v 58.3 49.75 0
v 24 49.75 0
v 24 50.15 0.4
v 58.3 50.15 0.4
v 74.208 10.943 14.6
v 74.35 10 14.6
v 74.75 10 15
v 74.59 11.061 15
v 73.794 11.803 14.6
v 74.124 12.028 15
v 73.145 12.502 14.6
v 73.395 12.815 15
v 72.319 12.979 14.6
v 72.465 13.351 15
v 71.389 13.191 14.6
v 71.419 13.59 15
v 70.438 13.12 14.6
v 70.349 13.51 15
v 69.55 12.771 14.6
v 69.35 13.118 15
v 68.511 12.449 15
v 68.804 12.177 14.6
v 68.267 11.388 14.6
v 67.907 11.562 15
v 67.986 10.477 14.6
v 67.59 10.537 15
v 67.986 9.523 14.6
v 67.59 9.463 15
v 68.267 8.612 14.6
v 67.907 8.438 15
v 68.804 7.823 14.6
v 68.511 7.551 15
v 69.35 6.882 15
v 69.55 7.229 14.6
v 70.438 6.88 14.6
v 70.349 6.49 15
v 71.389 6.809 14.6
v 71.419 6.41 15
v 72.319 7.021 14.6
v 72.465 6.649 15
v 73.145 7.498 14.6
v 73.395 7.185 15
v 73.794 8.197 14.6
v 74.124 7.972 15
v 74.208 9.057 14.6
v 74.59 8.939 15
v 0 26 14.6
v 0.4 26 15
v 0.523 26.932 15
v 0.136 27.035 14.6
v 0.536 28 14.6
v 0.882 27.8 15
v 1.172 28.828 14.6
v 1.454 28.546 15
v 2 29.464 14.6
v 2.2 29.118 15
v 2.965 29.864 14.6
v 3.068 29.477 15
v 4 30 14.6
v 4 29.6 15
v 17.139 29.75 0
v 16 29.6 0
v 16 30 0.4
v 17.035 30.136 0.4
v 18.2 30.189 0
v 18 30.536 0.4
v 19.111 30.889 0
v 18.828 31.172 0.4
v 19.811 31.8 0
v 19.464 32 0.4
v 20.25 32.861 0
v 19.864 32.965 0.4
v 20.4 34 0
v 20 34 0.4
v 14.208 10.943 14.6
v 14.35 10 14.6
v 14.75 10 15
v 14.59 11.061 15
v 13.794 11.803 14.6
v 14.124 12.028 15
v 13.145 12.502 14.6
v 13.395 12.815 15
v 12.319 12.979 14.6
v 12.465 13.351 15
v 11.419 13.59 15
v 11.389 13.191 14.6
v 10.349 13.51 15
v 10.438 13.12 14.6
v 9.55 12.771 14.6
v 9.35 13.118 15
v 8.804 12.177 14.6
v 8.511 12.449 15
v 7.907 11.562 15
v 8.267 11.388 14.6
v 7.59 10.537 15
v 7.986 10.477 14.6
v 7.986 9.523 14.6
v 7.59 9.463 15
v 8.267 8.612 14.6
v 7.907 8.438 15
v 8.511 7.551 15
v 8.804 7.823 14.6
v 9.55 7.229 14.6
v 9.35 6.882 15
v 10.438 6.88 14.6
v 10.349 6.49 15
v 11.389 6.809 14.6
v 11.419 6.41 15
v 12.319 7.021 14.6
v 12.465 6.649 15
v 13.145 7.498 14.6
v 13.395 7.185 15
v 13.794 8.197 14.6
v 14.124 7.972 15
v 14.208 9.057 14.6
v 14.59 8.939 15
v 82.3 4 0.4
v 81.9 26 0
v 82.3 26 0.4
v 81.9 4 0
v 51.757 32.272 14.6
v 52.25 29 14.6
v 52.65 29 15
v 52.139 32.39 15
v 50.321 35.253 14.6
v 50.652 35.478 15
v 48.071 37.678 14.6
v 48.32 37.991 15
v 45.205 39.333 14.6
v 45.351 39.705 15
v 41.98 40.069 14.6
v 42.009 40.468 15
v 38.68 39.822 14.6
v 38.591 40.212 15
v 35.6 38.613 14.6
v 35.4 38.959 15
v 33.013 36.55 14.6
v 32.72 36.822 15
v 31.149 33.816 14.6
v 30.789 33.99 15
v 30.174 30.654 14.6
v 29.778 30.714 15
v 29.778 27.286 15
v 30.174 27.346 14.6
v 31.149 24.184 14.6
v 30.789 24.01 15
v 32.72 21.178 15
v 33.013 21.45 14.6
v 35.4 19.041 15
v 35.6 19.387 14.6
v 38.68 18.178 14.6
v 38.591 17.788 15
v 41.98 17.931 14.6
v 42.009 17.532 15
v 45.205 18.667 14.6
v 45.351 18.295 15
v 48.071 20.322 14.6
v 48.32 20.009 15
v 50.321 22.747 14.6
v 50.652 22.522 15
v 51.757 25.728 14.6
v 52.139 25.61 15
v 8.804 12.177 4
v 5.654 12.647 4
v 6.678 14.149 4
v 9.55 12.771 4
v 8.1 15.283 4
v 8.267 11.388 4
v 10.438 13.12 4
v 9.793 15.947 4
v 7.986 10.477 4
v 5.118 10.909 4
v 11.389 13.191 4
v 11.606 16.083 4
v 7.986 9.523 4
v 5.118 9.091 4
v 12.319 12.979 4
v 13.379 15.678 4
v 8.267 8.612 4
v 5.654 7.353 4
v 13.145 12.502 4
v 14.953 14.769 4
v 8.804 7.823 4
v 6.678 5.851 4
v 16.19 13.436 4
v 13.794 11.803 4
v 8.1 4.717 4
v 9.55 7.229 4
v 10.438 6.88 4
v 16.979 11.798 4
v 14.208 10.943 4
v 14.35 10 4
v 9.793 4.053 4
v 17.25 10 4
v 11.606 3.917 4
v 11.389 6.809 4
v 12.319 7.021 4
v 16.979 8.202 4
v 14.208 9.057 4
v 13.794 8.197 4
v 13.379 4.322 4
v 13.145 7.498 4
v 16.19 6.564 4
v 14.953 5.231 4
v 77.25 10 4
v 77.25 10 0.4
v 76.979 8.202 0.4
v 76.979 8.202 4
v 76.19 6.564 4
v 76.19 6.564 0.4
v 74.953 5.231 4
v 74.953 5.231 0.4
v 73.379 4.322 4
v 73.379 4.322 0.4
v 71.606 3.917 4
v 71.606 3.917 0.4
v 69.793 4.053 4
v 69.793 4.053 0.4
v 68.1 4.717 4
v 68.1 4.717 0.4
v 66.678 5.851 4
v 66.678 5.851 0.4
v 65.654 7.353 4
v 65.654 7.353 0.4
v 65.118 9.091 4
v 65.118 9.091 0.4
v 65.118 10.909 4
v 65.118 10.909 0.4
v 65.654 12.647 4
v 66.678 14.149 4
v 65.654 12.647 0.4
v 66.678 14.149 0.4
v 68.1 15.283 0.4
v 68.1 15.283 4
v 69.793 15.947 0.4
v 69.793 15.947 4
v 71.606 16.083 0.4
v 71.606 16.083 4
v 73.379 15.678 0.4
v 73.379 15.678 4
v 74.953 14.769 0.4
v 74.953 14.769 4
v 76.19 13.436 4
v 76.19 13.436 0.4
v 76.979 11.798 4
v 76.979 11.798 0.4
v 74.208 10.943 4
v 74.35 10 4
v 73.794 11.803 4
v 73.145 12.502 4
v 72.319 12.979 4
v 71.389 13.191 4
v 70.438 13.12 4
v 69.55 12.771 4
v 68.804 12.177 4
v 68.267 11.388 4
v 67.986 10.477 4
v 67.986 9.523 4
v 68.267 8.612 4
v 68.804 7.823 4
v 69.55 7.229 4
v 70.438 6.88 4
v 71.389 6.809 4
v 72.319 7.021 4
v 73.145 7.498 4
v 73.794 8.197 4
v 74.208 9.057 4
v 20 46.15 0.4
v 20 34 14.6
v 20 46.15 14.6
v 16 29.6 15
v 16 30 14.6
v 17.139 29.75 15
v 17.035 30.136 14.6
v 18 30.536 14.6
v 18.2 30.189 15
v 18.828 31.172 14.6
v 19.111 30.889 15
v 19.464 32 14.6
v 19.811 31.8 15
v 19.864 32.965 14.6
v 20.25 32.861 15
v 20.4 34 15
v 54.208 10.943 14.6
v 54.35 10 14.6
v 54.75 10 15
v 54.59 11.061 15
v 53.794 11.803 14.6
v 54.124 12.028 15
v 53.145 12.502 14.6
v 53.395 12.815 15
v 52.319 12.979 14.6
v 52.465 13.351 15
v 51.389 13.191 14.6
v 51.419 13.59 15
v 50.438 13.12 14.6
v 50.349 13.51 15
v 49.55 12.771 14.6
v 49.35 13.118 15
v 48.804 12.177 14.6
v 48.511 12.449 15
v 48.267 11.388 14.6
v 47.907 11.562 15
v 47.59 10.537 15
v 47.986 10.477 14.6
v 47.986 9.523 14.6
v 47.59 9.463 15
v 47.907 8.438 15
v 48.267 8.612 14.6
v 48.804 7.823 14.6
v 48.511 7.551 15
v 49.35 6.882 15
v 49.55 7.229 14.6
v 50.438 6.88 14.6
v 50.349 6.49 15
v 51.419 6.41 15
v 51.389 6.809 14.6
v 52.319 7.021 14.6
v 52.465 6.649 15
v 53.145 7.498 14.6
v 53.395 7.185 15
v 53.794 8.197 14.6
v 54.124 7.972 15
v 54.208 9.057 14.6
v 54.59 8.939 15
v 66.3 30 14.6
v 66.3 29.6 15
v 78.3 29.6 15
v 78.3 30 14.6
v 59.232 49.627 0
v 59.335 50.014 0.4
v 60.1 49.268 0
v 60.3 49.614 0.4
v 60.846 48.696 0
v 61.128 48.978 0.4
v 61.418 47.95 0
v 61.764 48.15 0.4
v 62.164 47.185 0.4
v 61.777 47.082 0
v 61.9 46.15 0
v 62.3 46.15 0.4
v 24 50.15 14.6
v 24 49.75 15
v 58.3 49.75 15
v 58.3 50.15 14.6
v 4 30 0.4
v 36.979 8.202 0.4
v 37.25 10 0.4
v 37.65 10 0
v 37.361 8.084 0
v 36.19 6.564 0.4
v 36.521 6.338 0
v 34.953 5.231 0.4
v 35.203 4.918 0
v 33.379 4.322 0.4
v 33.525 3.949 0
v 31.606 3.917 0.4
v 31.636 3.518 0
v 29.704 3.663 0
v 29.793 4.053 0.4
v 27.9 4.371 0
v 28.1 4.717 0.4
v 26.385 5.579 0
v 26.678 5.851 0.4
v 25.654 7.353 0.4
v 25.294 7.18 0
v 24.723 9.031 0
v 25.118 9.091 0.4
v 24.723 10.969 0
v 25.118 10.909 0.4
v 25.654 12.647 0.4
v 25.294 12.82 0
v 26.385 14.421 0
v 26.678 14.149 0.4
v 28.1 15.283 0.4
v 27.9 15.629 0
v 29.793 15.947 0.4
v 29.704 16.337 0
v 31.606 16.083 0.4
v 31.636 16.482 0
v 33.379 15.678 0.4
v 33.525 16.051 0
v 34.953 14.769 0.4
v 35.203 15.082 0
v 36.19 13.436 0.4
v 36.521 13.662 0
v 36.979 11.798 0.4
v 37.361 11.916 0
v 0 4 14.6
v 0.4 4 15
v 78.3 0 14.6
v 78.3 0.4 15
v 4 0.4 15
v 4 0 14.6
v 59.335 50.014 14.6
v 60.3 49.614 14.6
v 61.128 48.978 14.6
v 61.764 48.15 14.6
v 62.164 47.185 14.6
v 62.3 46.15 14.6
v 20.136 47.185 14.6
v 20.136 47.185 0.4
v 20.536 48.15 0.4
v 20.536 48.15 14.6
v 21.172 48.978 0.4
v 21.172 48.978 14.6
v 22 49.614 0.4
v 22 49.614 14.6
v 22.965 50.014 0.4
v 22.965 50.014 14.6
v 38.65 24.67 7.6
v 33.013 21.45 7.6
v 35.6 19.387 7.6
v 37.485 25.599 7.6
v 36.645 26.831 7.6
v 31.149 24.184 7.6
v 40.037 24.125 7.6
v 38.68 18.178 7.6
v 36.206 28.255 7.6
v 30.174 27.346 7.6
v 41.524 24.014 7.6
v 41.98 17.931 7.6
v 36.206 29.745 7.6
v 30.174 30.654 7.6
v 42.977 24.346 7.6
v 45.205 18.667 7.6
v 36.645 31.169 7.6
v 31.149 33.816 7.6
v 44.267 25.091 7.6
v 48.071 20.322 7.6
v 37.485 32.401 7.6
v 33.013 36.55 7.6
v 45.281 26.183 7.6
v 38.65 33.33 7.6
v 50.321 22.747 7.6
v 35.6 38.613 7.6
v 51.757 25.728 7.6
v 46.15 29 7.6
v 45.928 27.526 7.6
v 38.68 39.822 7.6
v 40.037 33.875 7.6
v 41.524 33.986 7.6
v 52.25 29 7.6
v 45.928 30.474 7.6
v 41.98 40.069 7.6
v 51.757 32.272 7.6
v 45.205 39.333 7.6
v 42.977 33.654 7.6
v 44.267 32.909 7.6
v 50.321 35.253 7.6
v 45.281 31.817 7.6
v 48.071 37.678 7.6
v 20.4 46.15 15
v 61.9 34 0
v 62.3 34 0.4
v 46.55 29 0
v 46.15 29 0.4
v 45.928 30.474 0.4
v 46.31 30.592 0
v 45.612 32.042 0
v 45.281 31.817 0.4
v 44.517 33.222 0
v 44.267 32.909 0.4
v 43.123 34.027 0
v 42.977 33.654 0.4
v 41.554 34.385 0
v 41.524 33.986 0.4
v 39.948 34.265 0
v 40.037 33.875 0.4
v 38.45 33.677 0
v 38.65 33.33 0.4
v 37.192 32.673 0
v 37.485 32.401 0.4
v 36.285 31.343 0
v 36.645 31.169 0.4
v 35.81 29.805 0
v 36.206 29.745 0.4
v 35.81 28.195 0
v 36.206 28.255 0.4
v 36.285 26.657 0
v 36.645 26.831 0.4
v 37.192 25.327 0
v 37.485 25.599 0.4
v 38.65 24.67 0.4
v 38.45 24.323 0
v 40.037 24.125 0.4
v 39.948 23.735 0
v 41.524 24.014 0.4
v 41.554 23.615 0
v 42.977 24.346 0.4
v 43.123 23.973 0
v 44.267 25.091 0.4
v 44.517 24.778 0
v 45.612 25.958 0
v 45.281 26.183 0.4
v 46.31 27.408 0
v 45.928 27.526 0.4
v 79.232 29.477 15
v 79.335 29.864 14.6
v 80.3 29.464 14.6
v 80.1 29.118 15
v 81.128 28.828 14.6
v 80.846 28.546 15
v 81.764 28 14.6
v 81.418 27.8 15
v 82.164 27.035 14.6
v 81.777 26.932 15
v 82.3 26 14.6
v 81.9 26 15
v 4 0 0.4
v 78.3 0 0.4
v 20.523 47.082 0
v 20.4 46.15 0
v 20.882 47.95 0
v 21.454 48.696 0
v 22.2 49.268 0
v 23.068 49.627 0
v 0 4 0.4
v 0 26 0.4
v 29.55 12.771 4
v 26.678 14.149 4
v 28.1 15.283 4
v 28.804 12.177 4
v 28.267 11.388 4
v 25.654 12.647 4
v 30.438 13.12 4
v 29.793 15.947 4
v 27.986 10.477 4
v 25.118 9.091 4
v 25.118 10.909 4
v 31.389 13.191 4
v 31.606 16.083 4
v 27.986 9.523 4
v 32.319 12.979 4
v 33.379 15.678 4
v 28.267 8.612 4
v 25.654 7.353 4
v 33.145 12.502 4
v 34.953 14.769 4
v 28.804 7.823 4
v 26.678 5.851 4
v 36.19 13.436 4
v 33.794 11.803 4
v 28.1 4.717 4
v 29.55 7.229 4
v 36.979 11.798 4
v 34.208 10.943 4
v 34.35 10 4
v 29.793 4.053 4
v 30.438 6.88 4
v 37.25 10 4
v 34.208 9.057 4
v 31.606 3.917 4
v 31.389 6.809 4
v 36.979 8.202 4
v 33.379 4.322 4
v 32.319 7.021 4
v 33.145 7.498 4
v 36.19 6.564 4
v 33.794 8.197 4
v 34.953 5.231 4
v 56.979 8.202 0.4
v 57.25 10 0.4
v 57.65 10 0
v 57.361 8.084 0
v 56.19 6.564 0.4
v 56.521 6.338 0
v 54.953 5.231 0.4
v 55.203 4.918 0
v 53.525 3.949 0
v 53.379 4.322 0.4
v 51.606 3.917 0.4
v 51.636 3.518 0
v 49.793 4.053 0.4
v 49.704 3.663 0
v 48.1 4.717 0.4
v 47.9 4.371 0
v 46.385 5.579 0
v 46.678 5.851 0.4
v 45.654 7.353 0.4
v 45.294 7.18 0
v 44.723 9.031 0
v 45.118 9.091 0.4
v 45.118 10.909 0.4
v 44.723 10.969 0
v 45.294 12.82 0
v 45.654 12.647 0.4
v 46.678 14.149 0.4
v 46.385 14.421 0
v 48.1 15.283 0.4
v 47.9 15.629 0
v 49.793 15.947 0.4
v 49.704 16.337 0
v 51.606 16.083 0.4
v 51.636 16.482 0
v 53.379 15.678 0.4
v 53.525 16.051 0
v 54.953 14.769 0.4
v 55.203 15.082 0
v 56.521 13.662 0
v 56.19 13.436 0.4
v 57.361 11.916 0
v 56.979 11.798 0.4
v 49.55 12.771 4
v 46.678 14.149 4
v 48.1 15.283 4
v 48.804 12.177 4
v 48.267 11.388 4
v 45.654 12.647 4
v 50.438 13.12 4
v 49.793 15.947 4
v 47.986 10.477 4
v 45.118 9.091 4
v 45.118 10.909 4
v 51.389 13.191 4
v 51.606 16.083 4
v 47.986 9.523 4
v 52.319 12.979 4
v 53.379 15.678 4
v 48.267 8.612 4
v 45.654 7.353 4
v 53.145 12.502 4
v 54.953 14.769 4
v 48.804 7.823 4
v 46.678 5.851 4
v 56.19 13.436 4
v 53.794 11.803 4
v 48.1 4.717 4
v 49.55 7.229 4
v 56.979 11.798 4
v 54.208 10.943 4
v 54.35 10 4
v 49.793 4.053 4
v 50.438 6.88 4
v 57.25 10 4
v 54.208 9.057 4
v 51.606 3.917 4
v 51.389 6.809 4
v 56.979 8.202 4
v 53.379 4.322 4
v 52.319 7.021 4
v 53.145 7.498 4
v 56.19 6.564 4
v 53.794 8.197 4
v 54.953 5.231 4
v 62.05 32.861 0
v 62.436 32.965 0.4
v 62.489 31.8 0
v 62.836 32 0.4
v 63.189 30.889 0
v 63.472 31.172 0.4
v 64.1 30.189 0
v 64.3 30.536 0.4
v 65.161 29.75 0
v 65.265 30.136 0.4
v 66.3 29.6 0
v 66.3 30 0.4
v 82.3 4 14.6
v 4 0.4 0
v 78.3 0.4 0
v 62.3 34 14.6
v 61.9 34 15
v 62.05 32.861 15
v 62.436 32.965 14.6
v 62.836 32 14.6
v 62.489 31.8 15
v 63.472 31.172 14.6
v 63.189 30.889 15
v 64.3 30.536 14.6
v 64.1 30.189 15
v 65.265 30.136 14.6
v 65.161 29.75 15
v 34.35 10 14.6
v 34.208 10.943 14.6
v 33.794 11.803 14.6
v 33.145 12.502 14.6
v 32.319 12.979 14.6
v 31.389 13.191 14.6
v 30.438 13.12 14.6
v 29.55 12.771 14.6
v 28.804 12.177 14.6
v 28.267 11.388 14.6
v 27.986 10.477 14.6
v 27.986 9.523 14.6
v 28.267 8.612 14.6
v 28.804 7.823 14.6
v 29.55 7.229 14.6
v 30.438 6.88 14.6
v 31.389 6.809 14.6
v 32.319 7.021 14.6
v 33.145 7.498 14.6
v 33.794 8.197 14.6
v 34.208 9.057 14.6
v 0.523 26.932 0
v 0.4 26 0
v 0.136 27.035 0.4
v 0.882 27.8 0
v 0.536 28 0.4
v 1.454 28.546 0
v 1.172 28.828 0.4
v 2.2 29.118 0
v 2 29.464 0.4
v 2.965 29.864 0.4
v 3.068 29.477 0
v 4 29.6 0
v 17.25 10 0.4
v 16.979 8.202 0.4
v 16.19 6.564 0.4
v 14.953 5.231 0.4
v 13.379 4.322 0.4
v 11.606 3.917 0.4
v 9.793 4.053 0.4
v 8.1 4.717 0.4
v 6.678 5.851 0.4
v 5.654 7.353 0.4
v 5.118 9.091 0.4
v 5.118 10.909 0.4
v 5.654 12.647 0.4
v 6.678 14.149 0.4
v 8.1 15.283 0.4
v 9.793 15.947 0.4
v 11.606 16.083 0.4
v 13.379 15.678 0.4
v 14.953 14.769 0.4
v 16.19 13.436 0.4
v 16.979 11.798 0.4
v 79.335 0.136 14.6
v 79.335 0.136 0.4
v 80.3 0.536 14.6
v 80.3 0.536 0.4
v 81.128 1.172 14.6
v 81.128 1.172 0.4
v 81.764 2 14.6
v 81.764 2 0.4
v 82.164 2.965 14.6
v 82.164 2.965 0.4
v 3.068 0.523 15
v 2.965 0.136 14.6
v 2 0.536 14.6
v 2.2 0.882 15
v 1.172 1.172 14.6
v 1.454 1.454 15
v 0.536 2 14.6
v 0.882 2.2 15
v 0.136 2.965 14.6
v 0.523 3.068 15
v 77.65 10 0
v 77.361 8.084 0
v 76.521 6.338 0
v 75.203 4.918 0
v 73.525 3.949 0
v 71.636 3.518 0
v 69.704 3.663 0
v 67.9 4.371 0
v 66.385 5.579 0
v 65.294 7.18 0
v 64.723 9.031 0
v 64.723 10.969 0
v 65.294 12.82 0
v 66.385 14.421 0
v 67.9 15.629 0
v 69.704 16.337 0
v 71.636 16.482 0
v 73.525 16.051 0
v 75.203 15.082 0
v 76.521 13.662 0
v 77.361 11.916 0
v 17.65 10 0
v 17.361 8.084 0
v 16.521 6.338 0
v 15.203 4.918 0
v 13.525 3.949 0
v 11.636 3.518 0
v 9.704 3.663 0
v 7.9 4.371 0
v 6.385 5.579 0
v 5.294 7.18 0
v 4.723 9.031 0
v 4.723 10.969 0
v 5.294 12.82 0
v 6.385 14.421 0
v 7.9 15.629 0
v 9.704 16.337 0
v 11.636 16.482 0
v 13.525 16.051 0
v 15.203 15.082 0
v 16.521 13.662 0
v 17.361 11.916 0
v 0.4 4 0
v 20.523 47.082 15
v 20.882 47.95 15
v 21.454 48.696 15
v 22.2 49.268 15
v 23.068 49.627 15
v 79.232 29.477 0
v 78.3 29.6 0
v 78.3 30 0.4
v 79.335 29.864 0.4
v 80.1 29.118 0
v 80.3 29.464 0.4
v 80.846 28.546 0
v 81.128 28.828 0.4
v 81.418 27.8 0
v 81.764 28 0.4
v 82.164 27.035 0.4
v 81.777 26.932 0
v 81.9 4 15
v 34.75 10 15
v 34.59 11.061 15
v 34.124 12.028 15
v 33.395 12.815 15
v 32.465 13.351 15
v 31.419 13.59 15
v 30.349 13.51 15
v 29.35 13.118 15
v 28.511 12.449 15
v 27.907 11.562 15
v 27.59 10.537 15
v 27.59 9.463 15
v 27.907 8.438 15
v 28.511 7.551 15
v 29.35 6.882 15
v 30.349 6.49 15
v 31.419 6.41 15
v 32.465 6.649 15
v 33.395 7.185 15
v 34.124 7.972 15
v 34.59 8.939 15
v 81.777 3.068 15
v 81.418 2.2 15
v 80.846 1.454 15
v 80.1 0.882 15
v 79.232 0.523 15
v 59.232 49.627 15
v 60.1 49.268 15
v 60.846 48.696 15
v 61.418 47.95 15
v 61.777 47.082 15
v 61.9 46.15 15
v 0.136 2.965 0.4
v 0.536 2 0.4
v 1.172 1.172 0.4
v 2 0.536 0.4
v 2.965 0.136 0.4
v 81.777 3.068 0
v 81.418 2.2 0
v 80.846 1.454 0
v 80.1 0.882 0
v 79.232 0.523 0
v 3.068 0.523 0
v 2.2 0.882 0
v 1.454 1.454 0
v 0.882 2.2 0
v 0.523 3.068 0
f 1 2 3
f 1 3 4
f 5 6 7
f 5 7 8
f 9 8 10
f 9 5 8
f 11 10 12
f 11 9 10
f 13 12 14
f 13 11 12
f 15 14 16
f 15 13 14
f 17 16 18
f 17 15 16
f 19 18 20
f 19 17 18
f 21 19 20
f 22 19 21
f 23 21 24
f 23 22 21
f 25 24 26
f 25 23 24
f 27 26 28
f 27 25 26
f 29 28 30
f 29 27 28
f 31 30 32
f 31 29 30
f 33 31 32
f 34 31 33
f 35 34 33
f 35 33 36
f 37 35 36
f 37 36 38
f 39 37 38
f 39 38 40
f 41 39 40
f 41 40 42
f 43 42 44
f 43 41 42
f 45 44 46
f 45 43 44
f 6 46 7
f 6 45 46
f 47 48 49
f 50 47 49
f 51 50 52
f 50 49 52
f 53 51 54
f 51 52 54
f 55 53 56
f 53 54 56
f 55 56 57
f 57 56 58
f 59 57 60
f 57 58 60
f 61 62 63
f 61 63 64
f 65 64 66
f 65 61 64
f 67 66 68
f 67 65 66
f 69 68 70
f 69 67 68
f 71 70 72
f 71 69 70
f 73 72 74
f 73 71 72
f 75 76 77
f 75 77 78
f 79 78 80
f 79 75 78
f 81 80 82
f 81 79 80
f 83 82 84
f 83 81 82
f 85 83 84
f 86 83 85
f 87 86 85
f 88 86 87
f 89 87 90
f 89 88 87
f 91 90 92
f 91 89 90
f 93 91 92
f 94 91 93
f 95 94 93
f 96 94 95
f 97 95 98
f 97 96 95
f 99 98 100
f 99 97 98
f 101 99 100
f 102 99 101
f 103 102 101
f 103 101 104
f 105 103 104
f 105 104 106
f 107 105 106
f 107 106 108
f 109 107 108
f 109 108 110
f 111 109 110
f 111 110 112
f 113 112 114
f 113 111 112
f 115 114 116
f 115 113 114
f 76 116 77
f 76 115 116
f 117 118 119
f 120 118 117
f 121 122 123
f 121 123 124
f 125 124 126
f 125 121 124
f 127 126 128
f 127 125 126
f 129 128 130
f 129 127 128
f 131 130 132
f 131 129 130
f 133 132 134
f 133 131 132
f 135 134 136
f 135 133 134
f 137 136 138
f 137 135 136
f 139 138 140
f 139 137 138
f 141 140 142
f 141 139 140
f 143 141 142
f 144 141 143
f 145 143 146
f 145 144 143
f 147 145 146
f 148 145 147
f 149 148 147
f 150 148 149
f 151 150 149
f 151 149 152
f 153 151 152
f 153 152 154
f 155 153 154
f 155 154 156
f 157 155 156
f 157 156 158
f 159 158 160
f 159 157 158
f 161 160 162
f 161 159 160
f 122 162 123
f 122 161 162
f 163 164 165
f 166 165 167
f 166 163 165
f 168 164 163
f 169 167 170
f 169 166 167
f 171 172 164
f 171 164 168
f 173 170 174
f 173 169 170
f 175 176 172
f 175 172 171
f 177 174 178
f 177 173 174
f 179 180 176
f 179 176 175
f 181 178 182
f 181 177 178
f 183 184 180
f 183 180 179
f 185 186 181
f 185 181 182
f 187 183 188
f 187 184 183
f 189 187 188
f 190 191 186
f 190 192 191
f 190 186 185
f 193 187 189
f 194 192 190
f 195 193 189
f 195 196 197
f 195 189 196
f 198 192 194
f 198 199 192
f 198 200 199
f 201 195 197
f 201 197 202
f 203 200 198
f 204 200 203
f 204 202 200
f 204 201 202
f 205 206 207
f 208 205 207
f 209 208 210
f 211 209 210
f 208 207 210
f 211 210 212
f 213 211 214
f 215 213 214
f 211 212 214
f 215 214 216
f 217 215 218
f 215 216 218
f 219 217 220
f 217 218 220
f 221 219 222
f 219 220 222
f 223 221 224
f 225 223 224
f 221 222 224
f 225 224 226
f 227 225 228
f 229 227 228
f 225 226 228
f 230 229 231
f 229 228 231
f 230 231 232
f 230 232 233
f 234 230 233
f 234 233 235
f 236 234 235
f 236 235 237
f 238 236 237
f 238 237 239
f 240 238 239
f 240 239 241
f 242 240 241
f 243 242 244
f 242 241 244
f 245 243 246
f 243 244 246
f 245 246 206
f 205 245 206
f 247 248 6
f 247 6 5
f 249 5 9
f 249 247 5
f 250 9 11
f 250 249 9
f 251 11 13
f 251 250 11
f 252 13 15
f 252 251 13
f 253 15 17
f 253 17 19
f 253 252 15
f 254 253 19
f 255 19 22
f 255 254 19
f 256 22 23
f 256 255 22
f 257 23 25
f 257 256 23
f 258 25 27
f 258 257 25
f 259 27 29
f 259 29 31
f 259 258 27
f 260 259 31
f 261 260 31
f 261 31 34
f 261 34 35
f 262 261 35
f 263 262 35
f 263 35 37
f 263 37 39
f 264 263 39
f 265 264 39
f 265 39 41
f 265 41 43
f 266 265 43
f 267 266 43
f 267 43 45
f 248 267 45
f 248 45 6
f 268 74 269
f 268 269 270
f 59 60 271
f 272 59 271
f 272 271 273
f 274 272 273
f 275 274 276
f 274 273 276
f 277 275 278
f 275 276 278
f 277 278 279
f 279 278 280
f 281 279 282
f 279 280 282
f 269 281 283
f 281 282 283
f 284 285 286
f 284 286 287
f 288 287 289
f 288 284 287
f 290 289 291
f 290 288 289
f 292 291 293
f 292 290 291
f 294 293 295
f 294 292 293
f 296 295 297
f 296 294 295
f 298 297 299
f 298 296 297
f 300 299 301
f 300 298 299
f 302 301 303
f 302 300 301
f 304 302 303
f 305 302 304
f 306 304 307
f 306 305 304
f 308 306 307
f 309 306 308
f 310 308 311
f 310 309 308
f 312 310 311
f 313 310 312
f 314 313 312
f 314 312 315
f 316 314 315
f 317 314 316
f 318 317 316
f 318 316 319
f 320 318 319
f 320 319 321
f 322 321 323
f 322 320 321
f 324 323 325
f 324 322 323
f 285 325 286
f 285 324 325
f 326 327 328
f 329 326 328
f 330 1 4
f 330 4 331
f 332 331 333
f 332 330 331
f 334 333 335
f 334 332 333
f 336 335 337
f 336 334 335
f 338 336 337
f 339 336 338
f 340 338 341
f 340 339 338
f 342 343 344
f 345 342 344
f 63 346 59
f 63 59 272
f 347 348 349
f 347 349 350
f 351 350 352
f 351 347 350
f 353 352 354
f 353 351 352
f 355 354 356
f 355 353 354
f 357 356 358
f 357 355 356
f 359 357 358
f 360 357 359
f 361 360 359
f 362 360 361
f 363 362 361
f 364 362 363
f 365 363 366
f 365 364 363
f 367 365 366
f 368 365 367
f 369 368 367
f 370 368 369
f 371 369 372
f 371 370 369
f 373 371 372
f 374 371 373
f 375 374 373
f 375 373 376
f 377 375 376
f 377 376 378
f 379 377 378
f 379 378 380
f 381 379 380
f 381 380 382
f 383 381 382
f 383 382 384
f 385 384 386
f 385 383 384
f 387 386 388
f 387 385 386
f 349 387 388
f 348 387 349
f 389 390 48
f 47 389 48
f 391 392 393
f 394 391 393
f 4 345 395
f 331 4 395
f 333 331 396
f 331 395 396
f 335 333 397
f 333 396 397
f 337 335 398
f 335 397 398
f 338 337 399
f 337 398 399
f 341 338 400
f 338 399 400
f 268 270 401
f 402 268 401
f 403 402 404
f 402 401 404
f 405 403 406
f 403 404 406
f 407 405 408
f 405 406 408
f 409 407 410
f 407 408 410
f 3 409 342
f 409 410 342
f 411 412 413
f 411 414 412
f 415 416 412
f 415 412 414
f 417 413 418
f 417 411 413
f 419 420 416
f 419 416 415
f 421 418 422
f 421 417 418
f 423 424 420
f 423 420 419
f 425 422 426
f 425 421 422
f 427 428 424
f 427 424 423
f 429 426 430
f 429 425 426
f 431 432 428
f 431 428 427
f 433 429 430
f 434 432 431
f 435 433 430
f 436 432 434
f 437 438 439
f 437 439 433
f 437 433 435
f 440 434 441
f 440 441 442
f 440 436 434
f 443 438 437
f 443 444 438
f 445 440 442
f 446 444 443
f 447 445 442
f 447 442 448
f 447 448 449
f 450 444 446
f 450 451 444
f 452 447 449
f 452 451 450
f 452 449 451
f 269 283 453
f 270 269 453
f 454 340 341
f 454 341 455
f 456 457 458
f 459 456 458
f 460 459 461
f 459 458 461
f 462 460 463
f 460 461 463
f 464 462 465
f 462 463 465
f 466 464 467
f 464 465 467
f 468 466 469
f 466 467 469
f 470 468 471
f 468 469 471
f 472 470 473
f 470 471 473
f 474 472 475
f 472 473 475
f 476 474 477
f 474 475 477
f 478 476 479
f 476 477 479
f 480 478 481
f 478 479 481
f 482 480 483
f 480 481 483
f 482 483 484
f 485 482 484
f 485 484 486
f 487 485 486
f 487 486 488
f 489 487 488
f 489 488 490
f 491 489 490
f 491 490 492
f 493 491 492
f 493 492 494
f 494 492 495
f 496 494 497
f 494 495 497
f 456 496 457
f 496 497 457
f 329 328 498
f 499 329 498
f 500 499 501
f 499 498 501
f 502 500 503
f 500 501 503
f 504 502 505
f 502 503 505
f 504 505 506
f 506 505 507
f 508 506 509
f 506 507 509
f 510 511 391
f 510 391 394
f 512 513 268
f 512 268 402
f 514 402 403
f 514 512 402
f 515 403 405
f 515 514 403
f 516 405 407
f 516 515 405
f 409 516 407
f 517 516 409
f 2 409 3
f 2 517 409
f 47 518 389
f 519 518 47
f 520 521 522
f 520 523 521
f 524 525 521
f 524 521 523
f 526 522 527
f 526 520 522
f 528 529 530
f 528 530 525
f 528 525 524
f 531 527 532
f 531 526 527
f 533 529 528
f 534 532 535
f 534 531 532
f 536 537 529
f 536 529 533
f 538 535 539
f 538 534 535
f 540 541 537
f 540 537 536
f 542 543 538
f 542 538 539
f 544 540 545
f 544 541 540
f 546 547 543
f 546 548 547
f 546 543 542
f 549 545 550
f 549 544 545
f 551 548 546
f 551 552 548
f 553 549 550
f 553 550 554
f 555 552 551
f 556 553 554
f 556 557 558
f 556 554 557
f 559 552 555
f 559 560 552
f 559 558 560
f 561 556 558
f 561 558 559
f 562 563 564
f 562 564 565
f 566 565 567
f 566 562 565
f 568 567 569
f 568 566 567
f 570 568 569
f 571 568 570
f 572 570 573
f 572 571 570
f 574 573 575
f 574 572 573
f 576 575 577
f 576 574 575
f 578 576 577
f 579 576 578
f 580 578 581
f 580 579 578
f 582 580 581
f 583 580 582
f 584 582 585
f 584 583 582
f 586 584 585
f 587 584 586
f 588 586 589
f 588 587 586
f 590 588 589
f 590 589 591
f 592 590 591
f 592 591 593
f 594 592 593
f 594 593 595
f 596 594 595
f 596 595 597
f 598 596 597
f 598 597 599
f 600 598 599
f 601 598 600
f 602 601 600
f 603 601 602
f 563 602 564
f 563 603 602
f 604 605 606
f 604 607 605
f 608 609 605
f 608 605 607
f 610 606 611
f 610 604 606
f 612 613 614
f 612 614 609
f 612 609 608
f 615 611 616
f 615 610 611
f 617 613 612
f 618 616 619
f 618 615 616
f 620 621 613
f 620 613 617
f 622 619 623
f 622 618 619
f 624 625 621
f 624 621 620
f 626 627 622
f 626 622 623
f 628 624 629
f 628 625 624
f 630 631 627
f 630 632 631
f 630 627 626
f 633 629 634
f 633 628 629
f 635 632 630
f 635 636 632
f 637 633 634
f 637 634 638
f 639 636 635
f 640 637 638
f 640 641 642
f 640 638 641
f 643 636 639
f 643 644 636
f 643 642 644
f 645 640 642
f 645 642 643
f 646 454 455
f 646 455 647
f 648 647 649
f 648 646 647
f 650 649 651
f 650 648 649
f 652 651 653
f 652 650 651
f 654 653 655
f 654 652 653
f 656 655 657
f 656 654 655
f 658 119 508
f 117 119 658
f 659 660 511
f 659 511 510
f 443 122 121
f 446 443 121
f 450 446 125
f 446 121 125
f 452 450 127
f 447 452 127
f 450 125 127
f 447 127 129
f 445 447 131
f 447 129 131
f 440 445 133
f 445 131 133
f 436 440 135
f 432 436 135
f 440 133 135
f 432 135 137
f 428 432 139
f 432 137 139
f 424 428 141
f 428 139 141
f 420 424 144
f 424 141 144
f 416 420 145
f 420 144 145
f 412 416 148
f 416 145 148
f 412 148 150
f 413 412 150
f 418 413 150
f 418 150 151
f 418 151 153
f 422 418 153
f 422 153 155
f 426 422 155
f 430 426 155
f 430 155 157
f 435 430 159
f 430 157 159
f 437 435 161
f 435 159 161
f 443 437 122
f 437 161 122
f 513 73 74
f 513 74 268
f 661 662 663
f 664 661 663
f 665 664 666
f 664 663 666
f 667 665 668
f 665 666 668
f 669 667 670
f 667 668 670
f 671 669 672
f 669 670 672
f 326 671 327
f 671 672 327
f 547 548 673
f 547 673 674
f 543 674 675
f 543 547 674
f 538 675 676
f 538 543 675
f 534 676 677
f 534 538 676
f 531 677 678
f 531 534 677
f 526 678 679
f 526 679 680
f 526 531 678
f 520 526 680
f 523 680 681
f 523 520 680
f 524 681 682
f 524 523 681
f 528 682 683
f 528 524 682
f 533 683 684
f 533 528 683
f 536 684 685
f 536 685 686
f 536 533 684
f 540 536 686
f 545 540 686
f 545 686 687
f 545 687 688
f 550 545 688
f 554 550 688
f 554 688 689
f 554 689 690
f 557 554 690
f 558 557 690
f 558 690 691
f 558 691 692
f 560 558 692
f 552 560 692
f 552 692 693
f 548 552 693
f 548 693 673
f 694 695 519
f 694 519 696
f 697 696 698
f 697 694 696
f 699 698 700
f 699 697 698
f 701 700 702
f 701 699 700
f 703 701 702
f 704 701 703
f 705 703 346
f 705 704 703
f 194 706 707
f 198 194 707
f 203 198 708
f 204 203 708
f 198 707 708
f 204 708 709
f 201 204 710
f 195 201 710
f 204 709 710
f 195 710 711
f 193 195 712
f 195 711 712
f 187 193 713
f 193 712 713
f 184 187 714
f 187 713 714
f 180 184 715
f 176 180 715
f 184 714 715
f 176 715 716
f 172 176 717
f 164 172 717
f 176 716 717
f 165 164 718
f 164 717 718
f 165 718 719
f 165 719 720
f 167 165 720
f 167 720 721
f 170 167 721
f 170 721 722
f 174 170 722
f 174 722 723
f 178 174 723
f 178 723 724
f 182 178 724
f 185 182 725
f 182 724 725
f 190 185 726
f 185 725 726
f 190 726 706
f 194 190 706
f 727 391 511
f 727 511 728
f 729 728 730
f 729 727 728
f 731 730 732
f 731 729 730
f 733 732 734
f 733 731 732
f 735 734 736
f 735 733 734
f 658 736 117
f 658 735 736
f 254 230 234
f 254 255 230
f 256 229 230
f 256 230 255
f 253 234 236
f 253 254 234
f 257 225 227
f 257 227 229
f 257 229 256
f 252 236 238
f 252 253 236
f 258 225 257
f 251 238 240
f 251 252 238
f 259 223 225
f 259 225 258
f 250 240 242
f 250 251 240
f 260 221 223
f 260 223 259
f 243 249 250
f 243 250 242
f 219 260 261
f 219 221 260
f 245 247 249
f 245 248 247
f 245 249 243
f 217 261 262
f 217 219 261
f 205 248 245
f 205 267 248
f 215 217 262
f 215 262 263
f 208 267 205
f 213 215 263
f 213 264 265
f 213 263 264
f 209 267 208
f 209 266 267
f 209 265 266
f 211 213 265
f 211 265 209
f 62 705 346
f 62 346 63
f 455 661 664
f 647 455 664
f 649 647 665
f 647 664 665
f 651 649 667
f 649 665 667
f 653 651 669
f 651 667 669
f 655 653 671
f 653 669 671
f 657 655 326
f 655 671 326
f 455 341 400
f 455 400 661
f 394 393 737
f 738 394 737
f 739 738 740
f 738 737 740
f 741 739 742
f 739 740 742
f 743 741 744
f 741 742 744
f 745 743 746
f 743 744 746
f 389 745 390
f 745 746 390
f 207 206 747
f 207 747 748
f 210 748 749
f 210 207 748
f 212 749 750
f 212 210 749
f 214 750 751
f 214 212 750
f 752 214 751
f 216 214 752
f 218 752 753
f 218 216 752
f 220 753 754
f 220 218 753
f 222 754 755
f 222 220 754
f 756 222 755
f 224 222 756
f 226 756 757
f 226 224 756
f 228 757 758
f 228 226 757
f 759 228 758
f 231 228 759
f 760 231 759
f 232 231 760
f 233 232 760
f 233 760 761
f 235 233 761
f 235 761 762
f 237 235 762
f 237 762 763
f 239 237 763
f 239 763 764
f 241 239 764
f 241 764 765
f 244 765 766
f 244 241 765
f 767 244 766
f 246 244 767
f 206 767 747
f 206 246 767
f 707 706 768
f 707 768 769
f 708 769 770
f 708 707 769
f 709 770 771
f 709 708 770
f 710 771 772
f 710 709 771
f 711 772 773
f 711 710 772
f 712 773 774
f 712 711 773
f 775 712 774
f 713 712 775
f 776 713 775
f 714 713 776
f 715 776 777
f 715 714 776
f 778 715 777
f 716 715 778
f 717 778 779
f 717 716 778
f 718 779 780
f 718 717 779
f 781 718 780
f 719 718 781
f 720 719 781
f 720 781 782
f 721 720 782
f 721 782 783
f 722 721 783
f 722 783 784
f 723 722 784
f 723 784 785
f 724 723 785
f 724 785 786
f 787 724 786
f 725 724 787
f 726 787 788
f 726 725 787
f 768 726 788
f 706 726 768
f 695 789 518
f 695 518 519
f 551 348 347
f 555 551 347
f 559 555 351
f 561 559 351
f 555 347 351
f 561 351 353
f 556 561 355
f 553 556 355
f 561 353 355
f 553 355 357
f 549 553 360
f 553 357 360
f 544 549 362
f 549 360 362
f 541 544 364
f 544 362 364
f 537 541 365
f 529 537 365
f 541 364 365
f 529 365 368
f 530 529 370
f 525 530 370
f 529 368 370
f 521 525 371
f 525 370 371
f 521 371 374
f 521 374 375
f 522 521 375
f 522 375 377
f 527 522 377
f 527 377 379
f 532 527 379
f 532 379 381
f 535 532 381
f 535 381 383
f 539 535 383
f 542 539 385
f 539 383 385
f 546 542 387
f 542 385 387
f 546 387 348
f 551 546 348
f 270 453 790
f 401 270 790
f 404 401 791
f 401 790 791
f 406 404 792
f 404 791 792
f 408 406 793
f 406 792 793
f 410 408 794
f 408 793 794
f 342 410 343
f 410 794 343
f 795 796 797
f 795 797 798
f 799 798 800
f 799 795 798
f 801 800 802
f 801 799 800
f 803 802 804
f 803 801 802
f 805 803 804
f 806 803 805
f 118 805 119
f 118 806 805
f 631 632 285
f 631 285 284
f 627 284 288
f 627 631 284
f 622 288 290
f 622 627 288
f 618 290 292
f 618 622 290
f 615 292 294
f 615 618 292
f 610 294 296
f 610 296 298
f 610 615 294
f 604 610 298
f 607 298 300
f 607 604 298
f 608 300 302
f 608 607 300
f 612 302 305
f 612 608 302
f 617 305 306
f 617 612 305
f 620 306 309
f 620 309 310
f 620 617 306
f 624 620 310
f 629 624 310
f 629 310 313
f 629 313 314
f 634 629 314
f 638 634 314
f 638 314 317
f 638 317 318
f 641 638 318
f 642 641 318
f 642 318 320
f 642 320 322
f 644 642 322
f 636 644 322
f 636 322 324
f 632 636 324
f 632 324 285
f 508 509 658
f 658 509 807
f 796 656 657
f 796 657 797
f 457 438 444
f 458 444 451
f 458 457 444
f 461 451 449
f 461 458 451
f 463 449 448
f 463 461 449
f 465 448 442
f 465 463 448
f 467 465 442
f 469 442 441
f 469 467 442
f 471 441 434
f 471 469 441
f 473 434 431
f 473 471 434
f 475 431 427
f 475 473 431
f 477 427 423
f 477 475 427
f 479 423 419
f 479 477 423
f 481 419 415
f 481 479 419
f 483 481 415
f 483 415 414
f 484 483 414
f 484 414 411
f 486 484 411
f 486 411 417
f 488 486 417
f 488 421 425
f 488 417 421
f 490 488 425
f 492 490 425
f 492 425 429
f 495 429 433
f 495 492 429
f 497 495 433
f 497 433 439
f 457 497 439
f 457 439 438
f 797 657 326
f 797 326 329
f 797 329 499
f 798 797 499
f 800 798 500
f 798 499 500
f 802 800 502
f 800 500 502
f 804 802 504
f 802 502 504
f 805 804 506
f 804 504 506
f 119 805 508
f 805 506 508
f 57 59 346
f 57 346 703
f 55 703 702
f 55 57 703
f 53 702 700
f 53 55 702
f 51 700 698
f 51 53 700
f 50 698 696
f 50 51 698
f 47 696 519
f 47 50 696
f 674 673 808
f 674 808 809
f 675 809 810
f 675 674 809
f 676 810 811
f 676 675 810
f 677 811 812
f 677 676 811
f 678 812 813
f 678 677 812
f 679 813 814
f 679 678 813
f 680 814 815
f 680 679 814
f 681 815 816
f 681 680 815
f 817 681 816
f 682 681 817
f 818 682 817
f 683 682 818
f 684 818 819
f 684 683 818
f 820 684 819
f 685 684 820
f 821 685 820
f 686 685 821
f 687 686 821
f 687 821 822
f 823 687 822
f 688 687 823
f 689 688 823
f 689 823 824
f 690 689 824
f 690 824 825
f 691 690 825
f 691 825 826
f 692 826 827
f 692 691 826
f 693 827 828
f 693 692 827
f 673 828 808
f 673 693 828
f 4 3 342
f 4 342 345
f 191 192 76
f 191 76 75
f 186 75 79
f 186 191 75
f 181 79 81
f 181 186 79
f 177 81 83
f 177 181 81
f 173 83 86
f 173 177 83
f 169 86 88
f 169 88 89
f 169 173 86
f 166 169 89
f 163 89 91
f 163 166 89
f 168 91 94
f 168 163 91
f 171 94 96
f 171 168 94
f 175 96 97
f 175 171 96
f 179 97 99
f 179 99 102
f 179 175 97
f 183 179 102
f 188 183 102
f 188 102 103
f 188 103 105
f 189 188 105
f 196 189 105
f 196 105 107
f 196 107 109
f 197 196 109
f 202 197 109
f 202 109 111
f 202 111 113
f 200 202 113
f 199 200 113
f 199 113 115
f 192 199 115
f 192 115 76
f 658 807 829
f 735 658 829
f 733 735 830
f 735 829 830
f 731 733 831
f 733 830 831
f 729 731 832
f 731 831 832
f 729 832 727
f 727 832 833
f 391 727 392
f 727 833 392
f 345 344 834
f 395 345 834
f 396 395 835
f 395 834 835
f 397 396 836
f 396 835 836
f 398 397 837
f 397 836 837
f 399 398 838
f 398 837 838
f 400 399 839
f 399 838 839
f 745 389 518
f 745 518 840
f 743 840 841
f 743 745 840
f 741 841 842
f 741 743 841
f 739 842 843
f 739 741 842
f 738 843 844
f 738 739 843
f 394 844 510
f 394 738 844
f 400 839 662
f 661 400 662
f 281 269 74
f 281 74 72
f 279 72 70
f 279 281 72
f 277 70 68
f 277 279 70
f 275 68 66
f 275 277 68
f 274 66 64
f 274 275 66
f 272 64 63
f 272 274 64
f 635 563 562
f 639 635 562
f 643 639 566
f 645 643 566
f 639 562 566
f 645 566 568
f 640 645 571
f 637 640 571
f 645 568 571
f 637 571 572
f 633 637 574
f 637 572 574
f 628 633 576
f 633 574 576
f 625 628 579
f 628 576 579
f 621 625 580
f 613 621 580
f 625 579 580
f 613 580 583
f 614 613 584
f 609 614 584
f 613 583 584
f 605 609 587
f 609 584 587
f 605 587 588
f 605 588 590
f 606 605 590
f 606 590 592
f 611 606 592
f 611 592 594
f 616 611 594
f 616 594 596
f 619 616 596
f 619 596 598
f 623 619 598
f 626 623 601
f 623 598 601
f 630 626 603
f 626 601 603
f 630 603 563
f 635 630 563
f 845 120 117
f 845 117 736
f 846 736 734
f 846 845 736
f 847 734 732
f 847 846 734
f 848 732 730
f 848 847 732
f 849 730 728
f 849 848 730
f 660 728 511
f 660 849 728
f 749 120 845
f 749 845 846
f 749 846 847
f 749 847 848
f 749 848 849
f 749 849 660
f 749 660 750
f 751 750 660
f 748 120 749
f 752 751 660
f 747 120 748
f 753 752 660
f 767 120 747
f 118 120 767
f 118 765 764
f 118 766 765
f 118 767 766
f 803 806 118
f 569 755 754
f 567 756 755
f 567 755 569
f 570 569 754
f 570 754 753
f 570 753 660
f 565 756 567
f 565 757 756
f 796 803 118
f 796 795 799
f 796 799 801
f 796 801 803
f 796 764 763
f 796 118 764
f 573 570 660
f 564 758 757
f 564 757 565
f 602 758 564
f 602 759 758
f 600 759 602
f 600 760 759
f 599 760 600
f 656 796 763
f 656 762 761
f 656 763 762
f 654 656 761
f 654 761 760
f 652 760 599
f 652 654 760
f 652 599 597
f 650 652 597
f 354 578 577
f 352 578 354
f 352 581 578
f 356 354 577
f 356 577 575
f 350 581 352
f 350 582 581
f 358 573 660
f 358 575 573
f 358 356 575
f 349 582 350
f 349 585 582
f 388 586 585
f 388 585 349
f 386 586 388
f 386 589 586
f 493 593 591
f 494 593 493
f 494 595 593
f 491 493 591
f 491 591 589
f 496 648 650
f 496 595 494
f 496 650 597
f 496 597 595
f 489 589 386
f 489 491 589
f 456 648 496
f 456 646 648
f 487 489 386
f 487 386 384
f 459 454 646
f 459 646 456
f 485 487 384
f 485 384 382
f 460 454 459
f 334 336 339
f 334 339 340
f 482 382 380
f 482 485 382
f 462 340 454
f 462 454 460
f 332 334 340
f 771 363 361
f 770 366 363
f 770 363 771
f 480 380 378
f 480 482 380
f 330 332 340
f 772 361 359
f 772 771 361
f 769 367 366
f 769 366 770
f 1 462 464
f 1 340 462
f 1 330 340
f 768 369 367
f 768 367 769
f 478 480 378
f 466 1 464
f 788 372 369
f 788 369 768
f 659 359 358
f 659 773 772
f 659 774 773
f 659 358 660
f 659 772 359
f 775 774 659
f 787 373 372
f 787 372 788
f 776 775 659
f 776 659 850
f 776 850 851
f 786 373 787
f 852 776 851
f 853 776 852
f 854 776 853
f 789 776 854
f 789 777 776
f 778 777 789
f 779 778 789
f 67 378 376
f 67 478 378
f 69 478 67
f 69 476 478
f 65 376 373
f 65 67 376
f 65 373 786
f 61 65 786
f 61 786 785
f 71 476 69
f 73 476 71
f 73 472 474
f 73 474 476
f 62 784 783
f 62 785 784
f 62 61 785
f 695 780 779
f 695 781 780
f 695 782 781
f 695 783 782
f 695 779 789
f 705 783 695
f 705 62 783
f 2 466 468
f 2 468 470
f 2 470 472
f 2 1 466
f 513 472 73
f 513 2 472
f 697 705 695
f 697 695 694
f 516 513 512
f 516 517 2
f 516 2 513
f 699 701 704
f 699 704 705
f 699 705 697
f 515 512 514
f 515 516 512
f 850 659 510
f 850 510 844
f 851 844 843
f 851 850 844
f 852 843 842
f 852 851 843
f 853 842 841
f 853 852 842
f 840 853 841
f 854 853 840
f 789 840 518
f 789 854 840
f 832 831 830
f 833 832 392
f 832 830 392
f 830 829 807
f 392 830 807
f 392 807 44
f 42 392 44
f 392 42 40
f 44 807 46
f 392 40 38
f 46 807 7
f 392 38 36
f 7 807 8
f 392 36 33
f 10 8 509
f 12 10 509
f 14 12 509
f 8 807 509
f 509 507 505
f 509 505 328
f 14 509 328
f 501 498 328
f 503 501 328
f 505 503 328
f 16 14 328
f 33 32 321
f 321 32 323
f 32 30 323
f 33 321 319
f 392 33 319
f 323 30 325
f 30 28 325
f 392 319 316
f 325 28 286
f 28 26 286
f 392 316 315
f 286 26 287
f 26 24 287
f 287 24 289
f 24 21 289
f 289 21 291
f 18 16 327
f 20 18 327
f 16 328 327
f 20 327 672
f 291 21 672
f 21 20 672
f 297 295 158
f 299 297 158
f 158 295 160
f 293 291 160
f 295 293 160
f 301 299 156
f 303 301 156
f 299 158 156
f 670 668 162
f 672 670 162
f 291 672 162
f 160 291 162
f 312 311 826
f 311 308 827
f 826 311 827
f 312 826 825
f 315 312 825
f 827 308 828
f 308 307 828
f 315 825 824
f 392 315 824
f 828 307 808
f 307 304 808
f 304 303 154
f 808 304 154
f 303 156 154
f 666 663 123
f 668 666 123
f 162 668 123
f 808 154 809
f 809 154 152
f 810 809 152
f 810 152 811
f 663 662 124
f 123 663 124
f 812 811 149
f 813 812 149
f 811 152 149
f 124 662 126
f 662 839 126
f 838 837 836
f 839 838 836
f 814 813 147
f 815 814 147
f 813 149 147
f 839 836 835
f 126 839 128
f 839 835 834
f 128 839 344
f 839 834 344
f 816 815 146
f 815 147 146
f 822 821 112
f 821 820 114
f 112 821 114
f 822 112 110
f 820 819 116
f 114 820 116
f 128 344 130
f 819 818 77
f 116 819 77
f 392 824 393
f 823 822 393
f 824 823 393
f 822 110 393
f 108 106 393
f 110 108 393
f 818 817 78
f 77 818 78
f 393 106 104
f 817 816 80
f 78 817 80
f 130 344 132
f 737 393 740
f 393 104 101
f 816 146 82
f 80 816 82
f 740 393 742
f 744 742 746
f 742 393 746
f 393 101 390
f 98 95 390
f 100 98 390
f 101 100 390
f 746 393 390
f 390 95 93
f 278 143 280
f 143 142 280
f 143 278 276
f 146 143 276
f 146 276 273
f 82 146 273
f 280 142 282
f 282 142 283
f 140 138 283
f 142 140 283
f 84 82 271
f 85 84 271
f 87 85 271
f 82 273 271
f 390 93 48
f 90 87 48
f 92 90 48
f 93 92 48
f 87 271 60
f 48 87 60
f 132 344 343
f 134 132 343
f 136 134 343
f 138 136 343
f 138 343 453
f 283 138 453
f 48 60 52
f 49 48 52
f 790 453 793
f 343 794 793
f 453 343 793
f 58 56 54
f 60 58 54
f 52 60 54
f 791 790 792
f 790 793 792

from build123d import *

# Parameters (mm, degrees)
SKETCH_R        = 5
SKETCH_R_2      = 3.2
PAD_DEPTH       = 15
SKETCH002_R     = 6.1
POCKET001_DEPTH = 4
SKETCH003_R     = 11.1
POCKET_DEPTH    = 7.4
FILLET_R        = 4
CHAMFER_SIZE    = 0.4
CHAMFER001_SIZE = 0.4


with BuildPart() as part:
    # Sketch → Pad (new body)
    with BuildSketch(Plane.XY):
        Polygon((20, 30), (20, 50.15), (62.3, 50.15), (62.3, 30), (82.3, 30), (82.3, 0), (0, 0), (0, 30), align=None)
        with Locations((41.15, 29)):
            Circle(SKETCH_R, mode=Mode.SUBTRACT)
        with Locations((11.15, 10)):
            Circle(SKETCH_R_2, mode=Mode.SUBTRACT)
        with Locations((31.15, 10)):
            Circle(SKETCH_R_2, mode=Mode.SUBTRACT)
        with Locations((51.15, 10)):
            Circle(SKETCH_R_2, mode=Mode.SUBTRACT)
        with Locations((71.15, 10)):
            Circle(SKETCH_R_2, mode=Mode.SUBTRACT)
    extrude(amount=PAD_DEPTH)

    # Sketch002 → Pocket001 (cut)
    with BuildSketch(Plane(origin=(0, 0, 0), x_dir=(1, 0, 0), z_dir=(0, 0, -1))):
        with Locations((11.15, -10)):
            Circle(SKETCH002_R)
        with Locations((31.15, -10)):
            Circle(SKETCH002_R)
        with Locations((51.15, -10)):
            Circle(SKETCH002_R)
        with Locations((71.15, -10)):
            Circle(SKETCH002_R)
    extrude(amount=-POCKET001_DEPTH, mode=Mode.SUBTRACT)

    # Sketch003 (on Face5 of Pocket001) → Pocket (cut)
    with BuildSketch(Plane.XY.offset(15)):
        with Locations((41.15, 29)):
            Circle(SKETCH003_R)
    extrude(amount=-POCKET_DEPTH, mode=Mode.SUBTRACT)

    # Fillet
    fillet_edges = [part.edges().sort_by_distance(p)[0] for p in [
        (82.3, 0, 7.5),
        (0, 0, 7.5),
        (0, 30, 7.5),
        (20, 30, 7.5),
        (20, 50.15, 7.5),
        (62.3, 50.15, 7.5),
        (62.3, 30, 7.5),
        (82.3, 30, 7.5),
    ]]
    fillet(fillet_edges, radius=FILLET_R)

    # Chamfer
    chamfer_edges = [part.edges().sort_by_distance(p)[0] for p in [
        (20, 40.075, 15),
        (18.828427, 31.171573, 15),
        (21.171573, 48.978427, 15),
        (10, 30, 15),
        (41.15, 50.15, 15),
        (1.171573, 28.828427, 15),
        (61.128427, 48.978427, 15),
        (0, 15, 15),
        (62.3, 40.075, 15),
        (1.171573, 1.171573, 15),
        (63.471573, 31.171573, 15),
        (41.15, 0, 15),
        (72.3, 30, 15),
        (81.128427, 1.171573, 15),
        (81.128427, 28.828427, 15),
        (82.3, 15, 15),
        (67.95, 10, 15),
        (47.95, 10, 15),
        (27.95, 10, 15),
        (7.95, 10, 15),
        (30.05, 29, 15),
    ]]
    chamfer(chamfer_edges, length=CHAMFER_SIZE)

    # Chamfer001
    chamfer001_edges = [part.edges().sort_by_distance(p)[0] for p in [
        (20, 40.075, 0),
        (18.828427, 31.171573, 0),
        (21.171573, 48.978427, 0),
        (10, 30, 0),
        (41.15, 50.15, 0),
        (1.171573, 28.828427, 0),
        (61.128427, 48.978427, 0),
        (0, 15, 0),
        (62.3, 40.075, 0),
        (1.171573, 1.171573, 0),
        (63.471573, 31.171573, 0),
        (41.15, 0, 0),
        (72.3, 30, 0),
        (81.128427, 1.171573, 0),
        (81.128427, 28.828427, 0),
        (82.3, 15, 0),
        (65.05, 10, 0),
        (45.05, 10, 0),
        (25.05, 10, 0),
        (5.05, 10, 0),
        (36.15, 29, 0),
    ]]
    chamfer(chamfer001_edges, length=CHAMFER001_SIZE)


solid = part.part
